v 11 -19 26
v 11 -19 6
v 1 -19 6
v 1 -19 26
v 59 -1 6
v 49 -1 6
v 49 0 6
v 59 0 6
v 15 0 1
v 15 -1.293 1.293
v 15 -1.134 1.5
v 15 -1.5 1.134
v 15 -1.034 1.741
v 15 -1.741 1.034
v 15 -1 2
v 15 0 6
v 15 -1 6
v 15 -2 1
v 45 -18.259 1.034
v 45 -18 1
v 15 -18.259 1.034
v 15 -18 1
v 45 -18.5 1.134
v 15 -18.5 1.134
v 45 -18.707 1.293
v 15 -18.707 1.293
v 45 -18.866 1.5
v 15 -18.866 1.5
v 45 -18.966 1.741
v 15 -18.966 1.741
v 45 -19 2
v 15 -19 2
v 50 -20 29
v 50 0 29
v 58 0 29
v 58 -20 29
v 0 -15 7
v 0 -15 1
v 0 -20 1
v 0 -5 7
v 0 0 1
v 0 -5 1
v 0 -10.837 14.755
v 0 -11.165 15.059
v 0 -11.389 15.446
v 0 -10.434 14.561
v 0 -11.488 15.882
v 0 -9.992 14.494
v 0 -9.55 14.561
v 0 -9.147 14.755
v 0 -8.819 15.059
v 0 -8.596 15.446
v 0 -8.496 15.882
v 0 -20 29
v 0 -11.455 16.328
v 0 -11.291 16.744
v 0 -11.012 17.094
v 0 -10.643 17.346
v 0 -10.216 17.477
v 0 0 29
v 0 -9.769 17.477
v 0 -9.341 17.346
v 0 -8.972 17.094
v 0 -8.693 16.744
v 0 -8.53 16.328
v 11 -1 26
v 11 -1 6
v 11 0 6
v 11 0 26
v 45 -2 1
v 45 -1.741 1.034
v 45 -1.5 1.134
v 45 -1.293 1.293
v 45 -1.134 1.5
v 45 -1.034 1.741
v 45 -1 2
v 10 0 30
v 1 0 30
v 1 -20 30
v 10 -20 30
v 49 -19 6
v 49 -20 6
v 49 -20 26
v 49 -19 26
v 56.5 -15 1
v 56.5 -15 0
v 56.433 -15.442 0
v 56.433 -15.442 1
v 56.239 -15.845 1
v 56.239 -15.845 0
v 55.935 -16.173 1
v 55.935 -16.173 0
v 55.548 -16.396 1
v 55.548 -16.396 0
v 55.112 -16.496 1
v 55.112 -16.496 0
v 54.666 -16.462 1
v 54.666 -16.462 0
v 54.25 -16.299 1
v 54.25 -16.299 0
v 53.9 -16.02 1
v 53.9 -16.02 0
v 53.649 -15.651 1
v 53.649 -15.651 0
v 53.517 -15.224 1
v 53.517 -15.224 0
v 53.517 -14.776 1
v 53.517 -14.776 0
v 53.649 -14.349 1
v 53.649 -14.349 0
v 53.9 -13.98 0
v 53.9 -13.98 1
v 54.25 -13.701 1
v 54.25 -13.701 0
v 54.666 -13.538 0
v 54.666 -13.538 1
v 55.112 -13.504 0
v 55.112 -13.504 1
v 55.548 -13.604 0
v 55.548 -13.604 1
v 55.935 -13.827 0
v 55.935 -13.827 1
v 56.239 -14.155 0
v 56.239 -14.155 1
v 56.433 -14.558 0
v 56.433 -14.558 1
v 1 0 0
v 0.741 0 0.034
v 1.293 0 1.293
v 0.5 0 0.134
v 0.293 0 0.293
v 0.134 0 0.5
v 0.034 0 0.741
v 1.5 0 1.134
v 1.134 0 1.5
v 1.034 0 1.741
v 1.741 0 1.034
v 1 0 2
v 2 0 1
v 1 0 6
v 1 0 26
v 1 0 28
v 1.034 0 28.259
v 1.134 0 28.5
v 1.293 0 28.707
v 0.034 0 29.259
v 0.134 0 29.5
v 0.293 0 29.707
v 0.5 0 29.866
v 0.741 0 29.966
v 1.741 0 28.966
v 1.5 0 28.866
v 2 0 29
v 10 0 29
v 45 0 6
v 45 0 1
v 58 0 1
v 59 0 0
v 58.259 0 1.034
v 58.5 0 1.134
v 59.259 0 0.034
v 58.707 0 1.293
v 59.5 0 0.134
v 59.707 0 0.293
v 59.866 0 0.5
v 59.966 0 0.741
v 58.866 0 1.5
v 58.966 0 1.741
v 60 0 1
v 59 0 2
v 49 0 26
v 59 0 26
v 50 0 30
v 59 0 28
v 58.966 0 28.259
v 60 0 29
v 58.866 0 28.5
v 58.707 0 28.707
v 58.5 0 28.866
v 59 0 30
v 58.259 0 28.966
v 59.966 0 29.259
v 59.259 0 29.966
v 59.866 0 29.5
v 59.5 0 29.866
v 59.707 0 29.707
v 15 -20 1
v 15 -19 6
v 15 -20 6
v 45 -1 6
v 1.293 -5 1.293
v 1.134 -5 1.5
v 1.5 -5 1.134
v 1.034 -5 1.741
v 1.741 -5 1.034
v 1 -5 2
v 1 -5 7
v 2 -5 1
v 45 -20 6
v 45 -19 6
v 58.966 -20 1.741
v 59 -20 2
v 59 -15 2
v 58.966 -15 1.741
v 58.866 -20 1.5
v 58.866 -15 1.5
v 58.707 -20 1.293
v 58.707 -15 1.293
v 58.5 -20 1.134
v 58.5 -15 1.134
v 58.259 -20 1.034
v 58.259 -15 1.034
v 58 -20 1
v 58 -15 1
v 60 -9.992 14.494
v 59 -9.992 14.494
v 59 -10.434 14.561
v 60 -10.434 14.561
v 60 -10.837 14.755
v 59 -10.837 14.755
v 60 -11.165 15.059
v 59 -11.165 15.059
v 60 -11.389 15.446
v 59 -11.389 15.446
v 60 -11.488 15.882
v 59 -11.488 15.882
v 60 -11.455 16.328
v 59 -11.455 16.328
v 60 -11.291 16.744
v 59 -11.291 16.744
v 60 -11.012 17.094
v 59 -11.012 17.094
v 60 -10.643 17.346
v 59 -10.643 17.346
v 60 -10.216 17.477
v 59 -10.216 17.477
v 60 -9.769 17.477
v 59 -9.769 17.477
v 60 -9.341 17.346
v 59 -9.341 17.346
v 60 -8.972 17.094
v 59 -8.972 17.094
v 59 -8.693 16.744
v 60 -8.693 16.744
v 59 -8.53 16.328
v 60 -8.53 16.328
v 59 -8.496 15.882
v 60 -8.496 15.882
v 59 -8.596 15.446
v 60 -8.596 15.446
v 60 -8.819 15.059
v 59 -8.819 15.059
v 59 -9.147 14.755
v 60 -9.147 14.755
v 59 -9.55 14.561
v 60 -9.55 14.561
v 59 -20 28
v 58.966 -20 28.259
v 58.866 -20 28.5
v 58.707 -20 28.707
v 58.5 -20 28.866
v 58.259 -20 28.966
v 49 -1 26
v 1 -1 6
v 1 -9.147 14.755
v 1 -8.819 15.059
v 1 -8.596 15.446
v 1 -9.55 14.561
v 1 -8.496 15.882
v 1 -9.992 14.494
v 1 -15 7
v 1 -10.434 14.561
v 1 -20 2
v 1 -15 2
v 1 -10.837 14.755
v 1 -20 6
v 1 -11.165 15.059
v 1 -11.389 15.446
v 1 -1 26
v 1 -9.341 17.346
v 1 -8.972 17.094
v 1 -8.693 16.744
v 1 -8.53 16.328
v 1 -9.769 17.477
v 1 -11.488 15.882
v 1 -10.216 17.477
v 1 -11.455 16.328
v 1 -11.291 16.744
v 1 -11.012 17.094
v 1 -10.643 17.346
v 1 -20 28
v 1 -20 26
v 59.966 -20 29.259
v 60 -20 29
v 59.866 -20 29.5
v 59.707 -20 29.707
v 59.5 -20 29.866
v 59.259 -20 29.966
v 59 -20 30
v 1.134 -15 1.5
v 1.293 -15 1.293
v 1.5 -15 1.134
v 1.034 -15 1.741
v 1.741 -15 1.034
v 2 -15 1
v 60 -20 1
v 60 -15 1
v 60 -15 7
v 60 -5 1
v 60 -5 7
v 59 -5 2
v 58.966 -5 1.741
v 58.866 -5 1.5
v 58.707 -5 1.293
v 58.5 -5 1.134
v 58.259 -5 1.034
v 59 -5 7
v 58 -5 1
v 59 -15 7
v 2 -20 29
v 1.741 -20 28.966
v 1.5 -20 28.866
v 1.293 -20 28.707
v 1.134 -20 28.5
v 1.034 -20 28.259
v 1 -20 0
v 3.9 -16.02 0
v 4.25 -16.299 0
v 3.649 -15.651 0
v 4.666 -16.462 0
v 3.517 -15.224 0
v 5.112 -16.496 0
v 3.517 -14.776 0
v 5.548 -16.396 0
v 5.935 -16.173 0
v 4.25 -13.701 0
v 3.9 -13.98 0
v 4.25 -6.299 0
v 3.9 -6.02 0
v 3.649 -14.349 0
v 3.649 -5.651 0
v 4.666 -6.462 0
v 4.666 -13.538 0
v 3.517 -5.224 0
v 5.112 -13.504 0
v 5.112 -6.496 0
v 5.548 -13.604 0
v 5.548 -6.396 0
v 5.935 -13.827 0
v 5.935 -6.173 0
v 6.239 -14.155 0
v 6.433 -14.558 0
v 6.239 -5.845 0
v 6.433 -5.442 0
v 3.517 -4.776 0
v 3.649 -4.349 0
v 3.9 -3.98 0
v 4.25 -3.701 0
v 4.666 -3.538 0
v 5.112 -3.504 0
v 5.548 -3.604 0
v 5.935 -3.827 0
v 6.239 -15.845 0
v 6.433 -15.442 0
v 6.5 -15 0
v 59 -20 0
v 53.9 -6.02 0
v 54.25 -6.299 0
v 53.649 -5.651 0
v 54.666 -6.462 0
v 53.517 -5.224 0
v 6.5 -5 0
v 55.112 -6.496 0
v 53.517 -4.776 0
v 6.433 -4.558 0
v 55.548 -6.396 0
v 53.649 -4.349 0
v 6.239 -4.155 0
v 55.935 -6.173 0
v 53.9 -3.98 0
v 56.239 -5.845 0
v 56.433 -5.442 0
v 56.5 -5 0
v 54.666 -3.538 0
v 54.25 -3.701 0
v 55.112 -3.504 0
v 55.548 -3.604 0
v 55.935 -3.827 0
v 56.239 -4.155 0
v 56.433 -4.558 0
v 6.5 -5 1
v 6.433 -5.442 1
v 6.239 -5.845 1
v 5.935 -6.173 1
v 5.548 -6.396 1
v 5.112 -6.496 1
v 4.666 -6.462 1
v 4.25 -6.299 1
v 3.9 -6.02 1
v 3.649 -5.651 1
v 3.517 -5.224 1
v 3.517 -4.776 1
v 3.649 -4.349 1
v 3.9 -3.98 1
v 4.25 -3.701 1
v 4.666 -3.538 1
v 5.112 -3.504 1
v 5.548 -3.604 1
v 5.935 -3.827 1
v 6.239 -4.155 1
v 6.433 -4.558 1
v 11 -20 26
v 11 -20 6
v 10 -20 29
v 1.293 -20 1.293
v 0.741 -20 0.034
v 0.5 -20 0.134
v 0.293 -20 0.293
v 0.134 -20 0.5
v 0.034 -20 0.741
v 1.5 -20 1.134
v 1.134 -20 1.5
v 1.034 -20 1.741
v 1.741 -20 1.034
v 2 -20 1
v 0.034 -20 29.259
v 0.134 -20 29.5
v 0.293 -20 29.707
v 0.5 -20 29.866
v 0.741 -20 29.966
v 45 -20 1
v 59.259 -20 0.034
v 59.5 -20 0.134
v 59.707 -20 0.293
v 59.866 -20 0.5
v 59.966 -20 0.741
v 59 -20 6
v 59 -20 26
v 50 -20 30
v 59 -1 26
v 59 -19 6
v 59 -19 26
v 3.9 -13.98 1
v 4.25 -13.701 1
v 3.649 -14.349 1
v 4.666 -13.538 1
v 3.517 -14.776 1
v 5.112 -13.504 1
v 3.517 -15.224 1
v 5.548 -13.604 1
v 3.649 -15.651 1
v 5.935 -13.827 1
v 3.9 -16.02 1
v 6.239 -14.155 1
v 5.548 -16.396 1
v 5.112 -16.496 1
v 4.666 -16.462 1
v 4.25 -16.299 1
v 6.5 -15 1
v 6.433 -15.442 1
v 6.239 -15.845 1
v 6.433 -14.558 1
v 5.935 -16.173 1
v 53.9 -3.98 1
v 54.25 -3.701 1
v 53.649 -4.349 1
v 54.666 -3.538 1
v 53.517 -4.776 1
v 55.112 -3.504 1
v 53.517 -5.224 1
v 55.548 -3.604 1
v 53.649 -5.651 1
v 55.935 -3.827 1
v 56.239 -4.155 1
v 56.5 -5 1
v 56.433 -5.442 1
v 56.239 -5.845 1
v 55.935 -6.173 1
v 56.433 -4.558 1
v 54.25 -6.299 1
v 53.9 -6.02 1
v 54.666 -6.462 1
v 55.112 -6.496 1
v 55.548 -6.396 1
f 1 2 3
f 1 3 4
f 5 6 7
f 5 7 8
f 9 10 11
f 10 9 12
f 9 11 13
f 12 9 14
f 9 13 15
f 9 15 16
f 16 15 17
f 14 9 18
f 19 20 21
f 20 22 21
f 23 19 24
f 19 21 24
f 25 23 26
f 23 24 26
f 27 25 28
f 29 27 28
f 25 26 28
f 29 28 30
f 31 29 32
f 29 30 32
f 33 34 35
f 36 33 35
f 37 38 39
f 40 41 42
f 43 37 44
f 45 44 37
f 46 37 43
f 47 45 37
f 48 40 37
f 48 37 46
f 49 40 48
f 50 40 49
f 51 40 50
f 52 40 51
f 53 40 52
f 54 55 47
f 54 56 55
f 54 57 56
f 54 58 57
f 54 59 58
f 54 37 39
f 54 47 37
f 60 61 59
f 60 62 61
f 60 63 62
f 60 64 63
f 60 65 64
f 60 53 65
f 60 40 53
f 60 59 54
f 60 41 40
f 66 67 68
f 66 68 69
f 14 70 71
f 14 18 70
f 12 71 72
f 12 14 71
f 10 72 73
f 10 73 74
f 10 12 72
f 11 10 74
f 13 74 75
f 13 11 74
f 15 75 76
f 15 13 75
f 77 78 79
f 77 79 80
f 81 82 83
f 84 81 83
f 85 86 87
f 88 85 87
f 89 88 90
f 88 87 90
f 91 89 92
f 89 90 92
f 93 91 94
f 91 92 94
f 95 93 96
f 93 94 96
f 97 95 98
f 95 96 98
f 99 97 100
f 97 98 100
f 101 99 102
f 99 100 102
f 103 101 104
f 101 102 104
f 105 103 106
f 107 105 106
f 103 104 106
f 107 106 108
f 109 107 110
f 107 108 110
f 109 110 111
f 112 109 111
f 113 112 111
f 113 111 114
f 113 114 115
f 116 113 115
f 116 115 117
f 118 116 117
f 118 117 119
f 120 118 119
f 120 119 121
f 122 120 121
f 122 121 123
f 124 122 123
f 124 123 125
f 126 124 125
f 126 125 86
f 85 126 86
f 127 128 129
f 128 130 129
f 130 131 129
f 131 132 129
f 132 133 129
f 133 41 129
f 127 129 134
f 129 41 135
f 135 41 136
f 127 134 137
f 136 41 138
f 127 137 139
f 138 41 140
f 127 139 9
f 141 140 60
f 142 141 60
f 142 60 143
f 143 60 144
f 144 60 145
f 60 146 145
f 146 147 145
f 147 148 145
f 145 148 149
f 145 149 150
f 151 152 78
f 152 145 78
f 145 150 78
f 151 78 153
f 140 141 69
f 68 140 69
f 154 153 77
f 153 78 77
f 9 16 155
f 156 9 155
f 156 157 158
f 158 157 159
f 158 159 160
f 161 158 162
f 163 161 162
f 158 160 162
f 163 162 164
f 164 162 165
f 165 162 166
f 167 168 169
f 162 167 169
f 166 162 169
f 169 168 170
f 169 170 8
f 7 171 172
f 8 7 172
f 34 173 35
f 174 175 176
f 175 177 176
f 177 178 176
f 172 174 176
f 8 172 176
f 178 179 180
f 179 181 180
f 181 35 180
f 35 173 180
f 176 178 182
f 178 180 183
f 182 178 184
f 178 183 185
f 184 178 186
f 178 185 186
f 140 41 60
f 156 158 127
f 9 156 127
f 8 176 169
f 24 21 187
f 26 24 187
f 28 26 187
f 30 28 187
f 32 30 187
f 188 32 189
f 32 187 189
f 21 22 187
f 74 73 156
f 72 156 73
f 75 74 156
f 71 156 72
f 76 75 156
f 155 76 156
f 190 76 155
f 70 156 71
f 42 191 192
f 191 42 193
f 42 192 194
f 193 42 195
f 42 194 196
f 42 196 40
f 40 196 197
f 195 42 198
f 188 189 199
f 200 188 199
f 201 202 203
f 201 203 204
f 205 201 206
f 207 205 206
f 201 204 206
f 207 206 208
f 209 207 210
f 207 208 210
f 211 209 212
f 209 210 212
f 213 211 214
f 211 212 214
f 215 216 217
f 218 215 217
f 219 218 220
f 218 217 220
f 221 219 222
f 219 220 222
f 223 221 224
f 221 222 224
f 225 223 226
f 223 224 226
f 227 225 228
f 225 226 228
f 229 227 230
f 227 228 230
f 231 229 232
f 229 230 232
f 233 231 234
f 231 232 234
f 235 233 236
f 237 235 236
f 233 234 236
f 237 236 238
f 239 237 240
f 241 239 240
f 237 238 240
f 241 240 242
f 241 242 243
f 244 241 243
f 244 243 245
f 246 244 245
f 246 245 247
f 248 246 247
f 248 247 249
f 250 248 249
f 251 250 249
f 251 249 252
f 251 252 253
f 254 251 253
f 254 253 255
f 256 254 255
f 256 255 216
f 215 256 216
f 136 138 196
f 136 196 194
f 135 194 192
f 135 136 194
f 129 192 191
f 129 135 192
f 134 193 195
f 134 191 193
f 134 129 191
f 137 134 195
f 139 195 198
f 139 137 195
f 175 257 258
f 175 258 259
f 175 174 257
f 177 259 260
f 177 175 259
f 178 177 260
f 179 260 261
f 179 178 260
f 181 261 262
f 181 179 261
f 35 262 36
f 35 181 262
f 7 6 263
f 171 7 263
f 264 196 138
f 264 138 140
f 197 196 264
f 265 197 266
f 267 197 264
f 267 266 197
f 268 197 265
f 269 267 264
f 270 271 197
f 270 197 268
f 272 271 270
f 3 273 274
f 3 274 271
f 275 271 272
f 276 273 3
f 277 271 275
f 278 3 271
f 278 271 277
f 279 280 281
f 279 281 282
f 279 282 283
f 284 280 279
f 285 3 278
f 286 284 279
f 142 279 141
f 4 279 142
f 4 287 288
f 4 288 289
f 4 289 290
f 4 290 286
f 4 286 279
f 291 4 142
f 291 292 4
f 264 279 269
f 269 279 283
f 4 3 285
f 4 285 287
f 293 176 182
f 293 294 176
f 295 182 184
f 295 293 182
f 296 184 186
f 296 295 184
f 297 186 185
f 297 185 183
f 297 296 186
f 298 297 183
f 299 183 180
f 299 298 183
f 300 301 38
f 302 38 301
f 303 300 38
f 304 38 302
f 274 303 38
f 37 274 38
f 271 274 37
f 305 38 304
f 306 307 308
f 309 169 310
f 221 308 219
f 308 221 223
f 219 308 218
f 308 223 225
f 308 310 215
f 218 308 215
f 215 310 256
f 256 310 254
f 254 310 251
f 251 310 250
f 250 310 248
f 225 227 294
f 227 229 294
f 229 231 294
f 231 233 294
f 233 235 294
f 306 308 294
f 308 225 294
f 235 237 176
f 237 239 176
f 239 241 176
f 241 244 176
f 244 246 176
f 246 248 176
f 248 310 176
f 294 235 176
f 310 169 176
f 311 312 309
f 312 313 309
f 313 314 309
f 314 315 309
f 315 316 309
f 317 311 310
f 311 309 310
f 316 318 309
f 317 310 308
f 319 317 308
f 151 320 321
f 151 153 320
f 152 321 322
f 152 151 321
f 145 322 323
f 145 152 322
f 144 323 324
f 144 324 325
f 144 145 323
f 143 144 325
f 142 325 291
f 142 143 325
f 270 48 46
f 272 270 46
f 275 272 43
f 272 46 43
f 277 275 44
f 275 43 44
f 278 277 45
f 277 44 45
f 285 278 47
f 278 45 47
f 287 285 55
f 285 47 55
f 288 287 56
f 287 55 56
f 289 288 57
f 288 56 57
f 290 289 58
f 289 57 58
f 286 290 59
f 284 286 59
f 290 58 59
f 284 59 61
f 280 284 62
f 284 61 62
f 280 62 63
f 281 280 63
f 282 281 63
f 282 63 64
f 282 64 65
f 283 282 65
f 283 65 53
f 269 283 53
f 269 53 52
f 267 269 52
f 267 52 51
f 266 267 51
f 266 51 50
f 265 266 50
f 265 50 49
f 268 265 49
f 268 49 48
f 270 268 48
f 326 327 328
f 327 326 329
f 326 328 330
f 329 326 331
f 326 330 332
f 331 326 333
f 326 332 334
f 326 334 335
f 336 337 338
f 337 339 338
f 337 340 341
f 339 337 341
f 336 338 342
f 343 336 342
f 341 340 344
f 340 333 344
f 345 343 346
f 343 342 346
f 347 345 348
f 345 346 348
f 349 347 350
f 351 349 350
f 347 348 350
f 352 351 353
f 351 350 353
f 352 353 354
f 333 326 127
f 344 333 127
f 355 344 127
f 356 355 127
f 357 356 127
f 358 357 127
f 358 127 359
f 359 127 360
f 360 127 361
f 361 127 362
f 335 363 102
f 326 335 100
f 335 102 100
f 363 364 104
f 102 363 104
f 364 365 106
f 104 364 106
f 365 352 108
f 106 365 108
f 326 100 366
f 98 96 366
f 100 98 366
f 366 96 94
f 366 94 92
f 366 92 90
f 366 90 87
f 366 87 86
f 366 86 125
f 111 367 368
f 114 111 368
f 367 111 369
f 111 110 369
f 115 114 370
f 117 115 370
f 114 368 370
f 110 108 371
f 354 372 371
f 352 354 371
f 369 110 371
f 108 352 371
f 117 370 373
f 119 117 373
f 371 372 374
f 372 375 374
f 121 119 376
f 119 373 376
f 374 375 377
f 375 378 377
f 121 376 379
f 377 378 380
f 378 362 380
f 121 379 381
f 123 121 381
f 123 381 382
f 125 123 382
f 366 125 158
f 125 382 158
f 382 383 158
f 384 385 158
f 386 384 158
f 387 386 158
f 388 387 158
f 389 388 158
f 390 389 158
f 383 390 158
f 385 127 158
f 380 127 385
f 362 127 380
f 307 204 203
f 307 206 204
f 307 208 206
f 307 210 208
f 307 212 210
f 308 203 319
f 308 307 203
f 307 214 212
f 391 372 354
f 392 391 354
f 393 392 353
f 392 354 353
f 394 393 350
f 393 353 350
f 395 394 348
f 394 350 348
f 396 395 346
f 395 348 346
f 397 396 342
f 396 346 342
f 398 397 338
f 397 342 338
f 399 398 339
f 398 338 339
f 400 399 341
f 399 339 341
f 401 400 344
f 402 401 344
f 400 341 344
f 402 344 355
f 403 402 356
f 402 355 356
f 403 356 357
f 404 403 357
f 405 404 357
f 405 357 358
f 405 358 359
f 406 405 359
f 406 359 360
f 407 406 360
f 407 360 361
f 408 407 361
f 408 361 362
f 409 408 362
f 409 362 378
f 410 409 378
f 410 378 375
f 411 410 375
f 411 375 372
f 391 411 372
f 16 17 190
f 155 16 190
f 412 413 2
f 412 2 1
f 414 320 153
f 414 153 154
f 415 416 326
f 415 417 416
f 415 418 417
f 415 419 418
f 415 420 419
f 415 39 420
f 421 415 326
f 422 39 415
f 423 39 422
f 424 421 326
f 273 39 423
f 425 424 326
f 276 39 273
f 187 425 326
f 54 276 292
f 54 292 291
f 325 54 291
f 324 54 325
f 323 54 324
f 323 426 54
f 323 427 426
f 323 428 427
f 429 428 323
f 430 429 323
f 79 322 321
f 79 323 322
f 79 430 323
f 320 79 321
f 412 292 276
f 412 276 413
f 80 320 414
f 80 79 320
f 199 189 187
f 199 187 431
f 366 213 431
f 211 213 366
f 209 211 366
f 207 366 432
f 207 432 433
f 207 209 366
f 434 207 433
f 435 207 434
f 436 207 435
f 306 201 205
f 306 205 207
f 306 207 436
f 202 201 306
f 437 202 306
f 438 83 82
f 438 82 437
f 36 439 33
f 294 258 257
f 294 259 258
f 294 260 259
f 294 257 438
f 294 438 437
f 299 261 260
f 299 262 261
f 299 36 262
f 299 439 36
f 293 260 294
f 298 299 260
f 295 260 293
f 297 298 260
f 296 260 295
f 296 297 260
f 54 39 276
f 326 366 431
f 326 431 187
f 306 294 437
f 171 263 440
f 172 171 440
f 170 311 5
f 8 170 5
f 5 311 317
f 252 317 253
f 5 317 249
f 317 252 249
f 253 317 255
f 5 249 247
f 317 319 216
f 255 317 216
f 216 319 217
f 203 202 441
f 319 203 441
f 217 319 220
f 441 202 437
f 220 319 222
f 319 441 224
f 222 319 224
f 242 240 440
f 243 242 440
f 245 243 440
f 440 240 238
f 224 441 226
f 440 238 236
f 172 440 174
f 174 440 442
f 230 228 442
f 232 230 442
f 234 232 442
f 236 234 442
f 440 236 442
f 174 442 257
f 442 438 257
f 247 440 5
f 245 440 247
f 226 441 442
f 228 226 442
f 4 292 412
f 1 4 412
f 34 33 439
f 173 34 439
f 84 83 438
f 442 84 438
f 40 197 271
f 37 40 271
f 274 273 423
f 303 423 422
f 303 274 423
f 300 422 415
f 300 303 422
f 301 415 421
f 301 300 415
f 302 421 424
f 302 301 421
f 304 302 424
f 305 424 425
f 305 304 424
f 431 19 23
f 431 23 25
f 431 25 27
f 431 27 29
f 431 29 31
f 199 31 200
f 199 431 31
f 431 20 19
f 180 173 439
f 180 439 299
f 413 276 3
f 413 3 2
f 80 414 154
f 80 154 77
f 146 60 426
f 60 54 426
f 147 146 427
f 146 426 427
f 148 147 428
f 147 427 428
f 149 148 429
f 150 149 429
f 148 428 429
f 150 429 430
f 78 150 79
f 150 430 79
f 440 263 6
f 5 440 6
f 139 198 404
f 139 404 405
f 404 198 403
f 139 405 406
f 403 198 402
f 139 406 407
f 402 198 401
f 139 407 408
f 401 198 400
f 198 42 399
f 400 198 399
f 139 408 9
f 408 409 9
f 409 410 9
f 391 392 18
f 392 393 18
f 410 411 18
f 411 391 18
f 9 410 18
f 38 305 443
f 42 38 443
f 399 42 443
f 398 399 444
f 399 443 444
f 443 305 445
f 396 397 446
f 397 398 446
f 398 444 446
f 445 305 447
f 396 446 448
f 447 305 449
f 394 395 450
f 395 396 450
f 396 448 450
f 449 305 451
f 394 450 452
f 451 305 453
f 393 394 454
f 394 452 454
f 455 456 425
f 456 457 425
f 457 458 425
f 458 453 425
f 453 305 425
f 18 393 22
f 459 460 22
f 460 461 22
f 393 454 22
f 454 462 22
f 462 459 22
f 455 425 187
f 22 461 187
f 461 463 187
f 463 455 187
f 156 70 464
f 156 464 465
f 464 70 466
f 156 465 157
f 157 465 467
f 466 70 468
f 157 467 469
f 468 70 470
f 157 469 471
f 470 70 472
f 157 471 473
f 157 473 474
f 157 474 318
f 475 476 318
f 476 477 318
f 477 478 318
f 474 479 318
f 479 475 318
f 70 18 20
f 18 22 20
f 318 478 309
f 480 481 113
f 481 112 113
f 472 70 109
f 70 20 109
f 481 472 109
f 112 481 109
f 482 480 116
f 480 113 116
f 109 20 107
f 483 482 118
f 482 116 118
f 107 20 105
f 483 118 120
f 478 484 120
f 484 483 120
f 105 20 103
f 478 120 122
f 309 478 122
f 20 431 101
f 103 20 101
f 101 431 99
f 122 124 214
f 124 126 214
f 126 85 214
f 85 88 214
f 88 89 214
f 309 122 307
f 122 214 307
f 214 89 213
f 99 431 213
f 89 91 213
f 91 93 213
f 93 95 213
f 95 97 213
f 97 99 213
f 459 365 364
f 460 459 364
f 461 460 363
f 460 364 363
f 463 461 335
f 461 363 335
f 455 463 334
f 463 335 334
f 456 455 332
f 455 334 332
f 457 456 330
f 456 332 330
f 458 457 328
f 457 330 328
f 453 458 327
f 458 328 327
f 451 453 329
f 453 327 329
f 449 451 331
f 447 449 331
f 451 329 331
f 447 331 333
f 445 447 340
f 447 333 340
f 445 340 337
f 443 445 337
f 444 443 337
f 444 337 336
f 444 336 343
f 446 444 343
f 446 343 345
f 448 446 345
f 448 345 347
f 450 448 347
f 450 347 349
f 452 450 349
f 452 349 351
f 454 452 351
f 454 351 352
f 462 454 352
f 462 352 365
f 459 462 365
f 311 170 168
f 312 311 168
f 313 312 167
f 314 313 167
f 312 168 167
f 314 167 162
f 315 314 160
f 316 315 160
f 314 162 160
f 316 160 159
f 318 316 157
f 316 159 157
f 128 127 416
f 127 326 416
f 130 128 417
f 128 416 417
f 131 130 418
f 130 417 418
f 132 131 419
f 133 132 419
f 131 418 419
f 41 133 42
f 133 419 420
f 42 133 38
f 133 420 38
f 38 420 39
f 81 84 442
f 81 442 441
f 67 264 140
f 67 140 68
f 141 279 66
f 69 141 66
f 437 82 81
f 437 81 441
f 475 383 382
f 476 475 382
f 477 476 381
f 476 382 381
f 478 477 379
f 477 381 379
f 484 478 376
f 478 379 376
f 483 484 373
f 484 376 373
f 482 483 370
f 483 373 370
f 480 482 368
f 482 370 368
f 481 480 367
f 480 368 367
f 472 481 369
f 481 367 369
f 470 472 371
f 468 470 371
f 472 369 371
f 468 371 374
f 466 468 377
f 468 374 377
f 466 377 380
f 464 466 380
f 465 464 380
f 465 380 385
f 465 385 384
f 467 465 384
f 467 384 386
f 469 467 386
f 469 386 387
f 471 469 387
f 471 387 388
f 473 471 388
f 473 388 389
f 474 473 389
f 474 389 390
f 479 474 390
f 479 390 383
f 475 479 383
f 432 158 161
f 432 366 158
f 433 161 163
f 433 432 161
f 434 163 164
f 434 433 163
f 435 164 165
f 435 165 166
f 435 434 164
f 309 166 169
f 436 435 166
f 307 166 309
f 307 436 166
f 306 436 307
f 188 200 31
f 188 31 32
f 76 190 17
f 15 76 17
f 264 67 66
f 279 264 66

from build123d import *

# Parameters (mm, degrees)
SKETCH_W        = 60
SKETCH_H        = 30
PAD_DEPTH       = 20
SKETCH001_W     = 14
SKETCH001_H     = 5
POCKET_DEPTH    = 20.001
SKETCH002_W     = 14
SKETCH002_H     = 5
POCKET001_DEPTH = 20.001
SKETCH003_W     = 38
SKETCH003_H     = 20
POCKET002_DEPTH = 20.001
SKETCH005_W     = 38
SKETCH005_H     = 5
POCKET003_DEPTH = 20.001
SKETCH006_W     = 9
SKETCH006_H     = 3
POCKET004_DEPTH = 20.001
SKETCH007_W     = 1
SKETCH007_H     = 4
POCKET005_DEPTH = 20.001
SKETCH008_W     = 30
SKETCH008_H     = 18
POCKET006_DEPTH = 5
FILLET_R        = 1
FILLET001_R     = 1
FILLET002_R     = 1
FILLET003_R     = 1
FILLET004_R     = 1
FILLET005_R     = 1
FILLET006_R     = 1
FILLET007_R     = 1
SKETCH011_W     = 20
SKETCH011_H     = 18
POCKET007_DEPTH = 10
SKETCH012_W     = 20
SKETCH012_H     = 18
POCKET008_DEPTH = 10
FILLET008_R     = 1
FILLET009_R     = 1
SKETCH014_W     = 6
SKETCH014_H     = 10
POCKET009_DEPTH = 60.001
SKETCH015_R     = 1.5
POCKET010_DEPTH = 5
SKETCH016_R     = 1.5
POCKET011_DEPTH = 60.001


with BuildPart() as part:
    # Sketch → Pad (new body)
    with BuildSketch(Plane.XZ):
        with Locations((30, 15)):
            Rectangle(SKETCH_W, SKETCH_H)
    extrude(amount=PAD_DEPTH)

    # Sketch001 (on Face6 of Pad) → Pocket (cut, through all)
    with BuildSketch(Plane.XZ.offset(20)):
        with Locations((8, 3.5)):
            Rectangle(SKETCH001_W, SKETCH001_H)
    extrude(amount=-POCKET_DEPTH, mode=Mode.SUBTRACT)

    # Sketch002 (on Face5 of Pocket) → Pocket001 (cut, through all)
    with BuildSketch(Plane.XZ.offset(20)):
        with Locations((52, 3.5)):
            Rectangle(SKETCH002_W, SKETCH002_H)
    extrude(amount=-POCKET001_DEPTH, mode=Mode.SUBTRACT)

    # Sketch003 (on Face5 of Pocket001) → Pocket002 (cut, through all)
    with BuildSketch(Plane.XZ.offset(20)):
        with Locations((30, 16)):
            Rectangle(SKETCH003_W, SKETCH003_H)
    extrude(amount=-POCKET002_DEPTH, mode=Mode.SUBTRACT)

    # Sketch005 (on Face5 of Pocket002) → Pocket003 (cut, through all)
    with BuildSketch(Plane.XZ.offset(20)):
        with Locations((30, 28.5)):
            Rectangle(SKETCH005_W, SKETCH005_H)
    extrude(amount=-POCKET003_DEPTH, mode=Mode.SUBTRACT)

    # Sketch006 (on Face5 of Pocket003) → Pocket004 (cut, through all)
    with BuildSketch(Plane.XZ.offset(20)):
        with Locations((5.5, 27.5)):
            Rectangle(SKETCH006_W, SKETCH006_H)
        with Locations((54.5, 27.5)):
            Rectangle(SKETCH006_W, SKETCH006_H)
    extrude(amount=-POCKET004_DEPTH, mode=Mode.SUBTRACT)

    # Sketch007 (on Face5 of Pocket004) → Pocket005 (cut, through all)
    with BuildSketch(Plane.XZ.offset(20)):
        with Locations((10.5, 28)):
            Rectangle(SKETCH007_W, SKETCH007_H)
        with Locations((49.5, 28)):
            Rectangle(SKETCH007_W, SKETCH007_H)
    extrude(amount=-POCKET005_DEPTH, mode=Mode.SUBTRACT)

    # Sketch008 (on Face18 of Pocket005) → Pocket006 (cut)
    with BuildSketch(Plane(origin=(0, 0, 6), x_dir=(-1, 0, 0), z_dir=(0, 0, 1))):
        with Locations((-30, 10)):
            Rectangle(SKETCH008_W, SKETCH008_H)
    extrude(amount=-POCKET006_DEPTH, mode=Mode.SUBTRACT)

    # Fillet
    fillet_edges = [part.edges().sort_by_distance(p)[0] for p in [
        (60, -10, 0),
    ]]
    fillet(fillet_edges, radius=FILLET_R)

    # Fillet001
    fillet001_edges = [part.edges().sort_by_distance(p)[0] for p in [
        (0, -10, 0),
    ]]
    fillet(fillet001_edges, radius=FILLET001_R)

    # Fillet002
    fillet002_edges = [part.edges().sort_by_distance(p)[0] for p in [
        (0, -10, 30),
    ]]
    fillet(fillet002_edges, radius=FILLET002_R)

    # Fillet003
    fillet003_edges = [part.edges().sort_by_distance(p)[0] for p in [
        (60, -10, 30),
    ]]
    fillet(fillet003_edges, radius=FILLET003_R)

    # Fillet004
    fillet004_edges = [part.edges().sort_by_distance(p)[0] for p in [
        (1, -10, 29),
    ]]
    fillet(fillet004_edges, radius=FILLET004_R)

    # Fillet005
    fillet005_edges = [part.edges().sort_by_distance(p)[0] for p in [
        (1, -10, 1),
    ]]
    fillet(fillet005_edges, radius=FILLET005_R)

    # Fillet006
    fillet006_edges = [part.edges().sort_by_distance(p)[0] for p in [
        (59, -10, 29),
    ]]
    fillet(fillet006_edges, radius=FILLET006_R)

    # Fillet007
    fillet007_edges = [part.edges().sort_by_distance(p)[0] for p in [
        (59, -10, 1),
    ]]
    fillet(fillet007_edges, radius=FILLET007_R)

    # Sketch011 (on Face6 of Fillet007) → Pocket007 (cut)
    with BuildSketch(Plane(origin=(49, 0, 0), x_dir=(0, 0, -1), z_dir=(-1, 0, 0))):
        with Locations((-16, 10)):
            Rectangle(SKETCH011_W, SKETCH011_H)
    extrude(amount=-POCKET007_DEPTH, mode=Mode.SUBTRACT)

    # Sketch012 (on Face21 of Pocket007) → Pocket008 (cut)
    with BuildSketch(Plane(origin=(11, 0, 0), x_dir=(0, 0, 1), z_dir=(1, 0, 0))):
        with Locations((16, 10)):
            Rectangle(SKETCH012_W, SKETCH012_H)
    extrude(amount=-POCKET008_DEPTH, mode=Mode.SUBTRACT)

    # Fillet008
    fillet008_edges = [part.edges().sort_by_distance(p)[0] for p in [
        (30, -19, 1),
    ]]
    fillet(fillet008_edges, radius=FILLET008_R)

    # Fillet009
    fillet009_edges = [part.edges().sort_by_distance(p)[0] for p in [
        (30, -1, 1),
    ]]
    fillet(fillet009_edges, radius=FILLET009_R)

    # Sketch014 (on Face33 of Fillet009) → Pocket009 (cut, through all)
    with BuildSketch(Plane(origin=(60, 0, 0), x_dir=(0, 0, 1), z_dir=(1, 0, 0))):
        with Locations((4, 10)):
            Rectangle(SKETCH014_W, SKETCH014_H)
    extrude(amount=-POCKET009_DEPTH, mode=Mode.SUBTRACT)

    # Sketch015 (on Face32 of Pocket009) → Pocket010 (cut)
    with BuildSketch(Plane(origin=(0, 0, 0), x_dir=(1, 0, 0), z_dir=(0, 0, -1))):
        with Locations((55, 5)):
            Circle(SKETCH015_R)
        with Locations((55, 15)):
            Circle(SKETCH015_R)
        with Locations((5, 5)):
            Circle(SKETCH015_R)
        with Locations((5, 15)):
            Circle(SKETCH015_R)
    extrude(amount=-POCKET010_DEPTH, mode=Mode.SUBTRACT)

    # Sketch016 (on Face30 of Pocket010) → Pocket011 (cut, through all)
    with BuildSketch(Plane(origin=(0, 0, 0), x_dir=(0, 0, -1), z_dir=(-1, 0, 0))):
        with Locations((-15.994056, 9.992209)):
            Circle(SKETCH016_R)
    extrude(amount=-POCKET011_DEPTH, mode=Mode.SUBTRACT)


solid = part.part
